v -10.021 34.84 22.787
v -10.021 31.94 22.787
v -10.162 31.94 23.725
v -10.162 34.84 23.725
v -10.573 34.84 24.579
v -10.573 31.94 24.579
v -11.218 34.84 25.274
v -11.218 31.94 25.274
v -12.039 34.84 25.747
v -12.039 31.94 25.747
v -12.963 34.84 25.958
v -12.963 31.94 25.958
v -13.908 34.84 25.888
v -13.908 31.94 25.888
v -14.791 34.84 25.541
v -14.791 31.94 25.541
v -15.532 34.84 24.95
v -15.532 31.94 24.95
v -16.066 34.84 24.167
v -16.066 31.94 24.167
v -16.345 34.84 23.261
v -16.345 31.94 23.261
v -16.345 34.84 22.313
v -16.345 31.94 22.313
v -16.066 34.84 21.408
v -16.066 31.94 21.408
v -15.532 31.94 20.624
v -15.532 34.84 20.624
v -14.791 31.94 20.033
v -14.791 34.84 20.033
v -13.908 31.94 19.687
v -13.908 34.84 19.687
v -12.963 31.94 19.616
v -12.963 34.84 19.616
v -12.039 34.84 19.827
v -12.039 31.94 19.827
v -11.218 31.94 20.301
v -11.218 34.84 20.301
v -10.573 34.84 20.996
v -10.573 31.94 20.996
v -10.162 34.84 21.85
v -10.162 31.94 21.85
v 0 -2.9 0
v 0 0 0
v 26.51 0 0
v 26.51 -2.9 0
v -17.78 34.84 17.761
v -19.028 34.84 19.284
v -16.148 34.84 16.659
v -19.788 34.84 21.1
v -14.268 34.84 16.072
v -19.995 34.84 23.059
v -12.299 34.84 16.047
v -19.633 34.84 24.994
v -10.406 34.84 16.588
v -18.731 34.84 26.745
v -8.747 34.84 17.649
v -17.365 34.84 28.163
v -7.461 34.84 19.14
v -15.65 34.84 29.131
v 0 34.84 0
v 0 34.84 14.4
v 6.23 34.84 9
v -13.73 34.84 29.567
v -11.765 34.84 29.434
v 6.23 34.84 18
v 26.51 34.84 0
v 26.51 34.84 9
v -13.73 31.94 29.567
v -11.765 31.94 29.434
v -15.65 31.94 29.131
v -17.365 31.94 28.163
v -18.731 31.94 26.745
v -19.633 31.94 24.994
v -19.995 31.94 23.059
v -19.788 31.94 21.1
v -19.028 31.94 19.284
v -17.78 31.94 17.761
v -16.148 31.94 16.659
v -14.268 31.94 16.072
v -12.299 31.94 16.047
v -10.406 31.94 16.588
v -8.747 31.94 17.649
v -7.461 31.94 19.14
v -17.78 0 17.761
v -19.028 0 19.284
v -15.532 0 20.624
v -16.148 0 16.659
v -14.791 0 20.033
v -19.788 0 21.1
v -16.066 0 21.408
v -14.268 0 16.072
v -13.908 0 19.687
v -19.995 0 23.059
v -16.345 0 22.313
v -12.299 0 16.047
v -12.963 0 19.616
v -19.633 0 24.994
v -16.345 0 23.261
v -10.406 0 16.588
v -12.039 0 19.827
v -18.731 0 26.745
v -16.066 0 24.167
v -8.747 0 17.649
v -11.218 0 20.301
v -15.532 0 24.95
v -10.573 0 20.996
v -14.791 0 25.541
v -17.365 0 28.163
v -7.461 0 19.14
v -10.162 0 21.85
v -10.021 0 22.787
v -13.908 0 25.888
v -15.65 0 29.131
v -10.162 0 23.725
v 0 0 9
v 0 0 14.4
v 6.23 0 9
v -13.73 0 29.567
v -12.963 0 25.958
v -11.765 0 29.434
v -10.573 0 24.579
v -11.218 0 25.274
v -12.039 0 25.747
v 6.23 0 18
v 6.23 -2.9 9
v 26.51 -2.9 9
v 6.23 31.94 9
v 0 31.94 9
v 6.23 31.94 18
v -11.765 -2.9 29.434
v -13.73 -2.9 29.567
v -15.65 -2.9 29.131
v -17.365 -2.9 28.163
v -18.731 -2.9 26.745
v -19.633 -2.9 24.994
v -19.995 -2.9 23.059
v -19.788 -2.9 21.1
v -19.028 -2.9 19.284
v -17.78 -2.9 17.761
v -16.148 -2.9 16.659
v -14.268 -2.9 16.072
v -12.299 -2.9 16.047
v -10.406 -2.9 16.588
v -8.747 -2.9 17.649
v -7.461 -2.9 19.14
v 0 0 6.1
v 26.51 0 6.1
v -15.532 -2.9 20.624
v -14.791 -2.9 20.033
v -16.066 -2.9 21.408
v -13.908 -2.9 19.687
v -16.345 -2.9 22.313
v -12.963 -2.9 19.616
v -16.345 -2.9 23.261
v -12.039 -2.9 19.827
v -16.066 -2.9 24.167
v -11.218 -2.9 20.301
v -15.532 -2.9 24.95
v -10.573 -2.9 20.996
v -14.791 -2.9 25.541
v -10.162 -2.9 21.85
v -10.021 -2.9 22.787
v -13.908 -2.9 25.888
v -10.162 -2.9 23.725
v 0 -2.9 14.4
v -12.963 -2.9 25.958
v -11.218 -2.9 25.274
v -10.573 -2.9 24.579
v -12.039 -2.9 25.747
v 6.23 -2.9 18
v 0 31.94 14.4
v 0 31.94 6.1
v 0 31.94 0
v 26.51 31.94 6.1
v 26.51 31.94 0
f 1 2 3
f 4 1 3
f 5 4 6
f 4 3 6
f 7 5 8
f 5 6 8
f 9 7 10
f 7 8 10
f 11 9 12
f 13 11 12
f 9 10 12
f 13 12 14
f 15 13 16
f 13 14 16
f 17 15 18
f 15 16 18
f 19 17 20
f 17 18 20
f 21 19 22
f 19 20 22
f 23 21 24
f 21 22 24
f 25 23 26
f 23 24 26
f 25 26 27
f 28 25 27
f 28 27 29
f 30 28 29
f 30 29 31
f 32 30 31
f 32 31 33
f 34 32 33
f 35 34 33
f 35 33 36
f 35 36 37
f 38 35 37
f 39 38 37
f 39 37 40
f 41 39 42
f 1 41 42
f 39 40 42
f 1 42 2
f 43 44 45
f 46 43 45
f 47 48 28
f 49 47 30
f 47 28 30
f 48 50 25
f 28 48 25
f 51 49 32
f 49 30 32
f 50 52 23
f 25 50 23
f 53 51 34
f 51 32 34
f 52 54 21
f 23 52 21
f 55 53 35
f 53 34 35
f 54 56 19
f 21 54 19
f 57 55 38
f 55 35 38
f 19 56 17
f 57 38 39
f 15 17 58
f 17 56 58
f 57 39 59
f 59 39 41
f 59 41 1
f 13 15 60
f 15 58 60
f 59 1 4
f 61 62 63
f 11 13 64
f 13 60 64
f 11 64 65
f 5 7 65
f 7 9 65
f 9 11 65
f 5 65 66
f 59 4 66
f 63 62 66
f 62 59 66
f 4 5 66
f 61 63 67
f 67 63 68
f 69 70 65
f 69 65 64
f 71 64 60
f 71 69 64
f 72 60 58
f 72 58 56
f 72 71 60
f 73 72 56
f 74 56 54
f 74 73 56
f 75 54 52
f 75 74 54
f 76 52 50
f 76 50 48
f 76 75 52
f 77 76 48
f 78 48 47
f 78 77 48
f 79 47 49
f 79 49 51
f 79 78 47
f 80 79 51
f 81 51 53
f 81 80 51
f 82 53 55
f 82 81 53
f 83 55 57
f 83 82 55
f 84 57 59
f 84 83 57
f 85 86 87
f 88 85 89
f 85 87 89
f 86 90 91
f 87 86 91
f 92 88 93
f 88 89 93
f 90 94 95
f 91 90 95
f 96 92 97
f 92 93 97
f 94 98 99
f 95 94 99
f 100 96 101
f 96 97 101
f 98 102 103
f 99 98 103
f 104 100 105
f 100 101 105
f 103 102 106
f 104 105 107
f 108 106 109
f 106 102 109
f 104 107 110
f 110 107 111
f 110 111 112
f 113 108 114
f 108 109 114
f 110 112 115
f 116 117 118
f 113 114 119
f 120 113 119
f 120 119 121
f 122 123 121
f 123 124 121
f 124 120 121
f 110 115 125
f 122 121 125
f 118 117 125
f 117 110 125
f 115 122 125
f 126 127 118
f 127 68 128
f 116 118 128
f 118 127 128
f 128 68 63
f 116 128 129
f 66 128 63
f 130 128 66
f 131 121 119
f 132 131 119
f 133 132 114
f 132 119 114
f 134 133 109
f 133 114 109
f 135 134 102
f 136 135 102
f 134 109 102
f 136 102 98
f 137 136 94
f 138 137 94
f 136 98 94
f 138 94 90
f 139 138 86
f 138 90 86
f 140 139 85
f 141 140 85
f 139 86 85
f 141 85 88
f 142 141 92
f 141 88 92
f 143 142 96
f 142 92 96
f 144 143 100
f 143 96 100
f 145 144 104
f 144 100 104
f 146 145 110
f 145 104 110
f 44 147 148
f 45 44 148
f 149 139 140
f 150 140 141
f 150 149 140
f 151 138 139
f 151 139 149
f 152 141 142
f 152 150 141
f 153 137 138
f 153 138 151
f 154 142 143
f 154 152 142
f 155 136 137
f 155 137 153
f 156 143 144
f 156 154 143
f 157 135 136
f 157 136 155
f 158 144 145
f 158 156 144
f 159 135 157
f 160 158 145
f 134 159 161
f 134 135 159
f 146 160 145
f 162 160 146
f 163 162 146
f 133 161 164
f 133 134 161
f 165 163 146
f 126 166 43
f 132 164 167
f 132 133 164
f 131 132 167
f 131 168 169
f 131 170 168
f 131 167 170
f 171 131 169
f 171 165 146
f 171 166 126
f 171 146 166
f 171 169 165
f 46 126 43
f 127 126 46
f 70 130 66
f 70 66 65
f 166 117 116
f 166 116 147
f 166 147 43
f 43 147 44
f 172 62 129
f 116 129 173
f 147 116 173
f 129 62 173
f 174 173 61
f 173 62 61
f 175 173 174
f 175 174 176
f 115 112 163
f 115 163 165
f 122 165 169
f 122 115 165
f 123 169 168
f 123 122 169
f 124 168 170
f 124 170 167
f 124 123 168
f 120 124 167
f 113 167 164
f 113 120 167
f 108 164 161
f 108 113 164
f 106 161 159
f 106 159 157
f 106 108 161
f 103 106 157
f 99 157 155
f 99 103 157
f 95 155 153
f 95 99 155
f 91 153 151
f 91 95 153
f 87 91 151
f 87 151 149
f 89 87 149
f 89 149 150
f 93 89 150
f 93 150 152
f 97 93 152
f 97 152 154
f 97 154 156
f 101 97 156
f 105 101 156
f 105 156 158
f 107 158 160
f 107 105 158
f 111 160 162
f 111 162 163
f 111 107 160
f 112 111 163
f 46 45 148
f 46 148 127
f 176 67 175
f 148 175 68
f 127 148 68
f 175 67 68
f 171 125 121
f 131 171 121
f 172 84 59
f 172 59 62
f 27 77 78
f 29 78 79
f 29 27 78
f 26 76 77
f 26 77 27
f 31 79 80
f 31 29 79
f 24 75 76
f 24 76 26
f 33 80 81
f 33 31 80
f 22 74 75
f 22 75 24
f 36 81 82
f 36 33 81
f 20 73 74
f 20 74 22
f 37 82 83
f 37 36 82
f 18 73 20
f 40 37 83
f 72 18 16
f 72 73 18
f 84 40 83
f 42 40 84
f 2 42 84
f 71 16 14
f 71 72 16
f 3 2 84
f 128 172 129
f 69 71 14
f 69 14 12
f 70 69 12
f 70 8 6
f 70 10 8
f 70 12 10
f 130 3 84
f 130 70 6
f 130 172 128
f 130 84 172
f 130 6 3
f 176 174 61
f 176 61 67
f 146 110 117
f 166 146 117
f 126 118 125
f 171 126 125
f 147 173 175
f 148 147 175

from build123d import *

# Parameters (mm, degrees)
F0_R     = 3.18
F1_DEPTH = 2.9
F3_DEPTH = 18.87


with BuildPart() as f1:
    # F0 (on Front) → F1 (new body)
    with BuildSketch(Plane.XZ):
        with BuildLine():
            Line((0, 0), (26.51, 0))
            Line((26.51, 0), (26.51, 9))
            Line((26.51, 9), (6.23, 9))
            Line((6.23, 9), (6.23, 18))
            Line((6.23, 18), (-11.764806, 29.434014))
            ThreePointArc((-11.764806, 29.434014), (-19.474339, 20.164339), (-7.461201, 19.140478))
            Line((-7.461201, 19.140478), (0, 14.399584))
            Line((0, 14.399584), (0, 0))
        make_face()
        with Locations((-13.200586, 22.78732)):
            Circle(F0_R, mode=Mode.SUBTRACT)
    extrude(amount=F1_DEPTH)

    # F2 (on face) → F3 (join)
    with BuildSketch(Plane.XZ.offset(2.9)):
        Polygon((26.51, 9), (6.23, 9), (0, 9), (0, 6.1), (26.51, 6.1), align=None)
    extrude(amount=-F3_DEPTH)

    # F5: F1 across plane


with BuildPart() as f1_1:
    add(f1.part)
    add(f1.part.mirror(Plane.XZ.offset(-15.97)))


solid = f1_1.part
